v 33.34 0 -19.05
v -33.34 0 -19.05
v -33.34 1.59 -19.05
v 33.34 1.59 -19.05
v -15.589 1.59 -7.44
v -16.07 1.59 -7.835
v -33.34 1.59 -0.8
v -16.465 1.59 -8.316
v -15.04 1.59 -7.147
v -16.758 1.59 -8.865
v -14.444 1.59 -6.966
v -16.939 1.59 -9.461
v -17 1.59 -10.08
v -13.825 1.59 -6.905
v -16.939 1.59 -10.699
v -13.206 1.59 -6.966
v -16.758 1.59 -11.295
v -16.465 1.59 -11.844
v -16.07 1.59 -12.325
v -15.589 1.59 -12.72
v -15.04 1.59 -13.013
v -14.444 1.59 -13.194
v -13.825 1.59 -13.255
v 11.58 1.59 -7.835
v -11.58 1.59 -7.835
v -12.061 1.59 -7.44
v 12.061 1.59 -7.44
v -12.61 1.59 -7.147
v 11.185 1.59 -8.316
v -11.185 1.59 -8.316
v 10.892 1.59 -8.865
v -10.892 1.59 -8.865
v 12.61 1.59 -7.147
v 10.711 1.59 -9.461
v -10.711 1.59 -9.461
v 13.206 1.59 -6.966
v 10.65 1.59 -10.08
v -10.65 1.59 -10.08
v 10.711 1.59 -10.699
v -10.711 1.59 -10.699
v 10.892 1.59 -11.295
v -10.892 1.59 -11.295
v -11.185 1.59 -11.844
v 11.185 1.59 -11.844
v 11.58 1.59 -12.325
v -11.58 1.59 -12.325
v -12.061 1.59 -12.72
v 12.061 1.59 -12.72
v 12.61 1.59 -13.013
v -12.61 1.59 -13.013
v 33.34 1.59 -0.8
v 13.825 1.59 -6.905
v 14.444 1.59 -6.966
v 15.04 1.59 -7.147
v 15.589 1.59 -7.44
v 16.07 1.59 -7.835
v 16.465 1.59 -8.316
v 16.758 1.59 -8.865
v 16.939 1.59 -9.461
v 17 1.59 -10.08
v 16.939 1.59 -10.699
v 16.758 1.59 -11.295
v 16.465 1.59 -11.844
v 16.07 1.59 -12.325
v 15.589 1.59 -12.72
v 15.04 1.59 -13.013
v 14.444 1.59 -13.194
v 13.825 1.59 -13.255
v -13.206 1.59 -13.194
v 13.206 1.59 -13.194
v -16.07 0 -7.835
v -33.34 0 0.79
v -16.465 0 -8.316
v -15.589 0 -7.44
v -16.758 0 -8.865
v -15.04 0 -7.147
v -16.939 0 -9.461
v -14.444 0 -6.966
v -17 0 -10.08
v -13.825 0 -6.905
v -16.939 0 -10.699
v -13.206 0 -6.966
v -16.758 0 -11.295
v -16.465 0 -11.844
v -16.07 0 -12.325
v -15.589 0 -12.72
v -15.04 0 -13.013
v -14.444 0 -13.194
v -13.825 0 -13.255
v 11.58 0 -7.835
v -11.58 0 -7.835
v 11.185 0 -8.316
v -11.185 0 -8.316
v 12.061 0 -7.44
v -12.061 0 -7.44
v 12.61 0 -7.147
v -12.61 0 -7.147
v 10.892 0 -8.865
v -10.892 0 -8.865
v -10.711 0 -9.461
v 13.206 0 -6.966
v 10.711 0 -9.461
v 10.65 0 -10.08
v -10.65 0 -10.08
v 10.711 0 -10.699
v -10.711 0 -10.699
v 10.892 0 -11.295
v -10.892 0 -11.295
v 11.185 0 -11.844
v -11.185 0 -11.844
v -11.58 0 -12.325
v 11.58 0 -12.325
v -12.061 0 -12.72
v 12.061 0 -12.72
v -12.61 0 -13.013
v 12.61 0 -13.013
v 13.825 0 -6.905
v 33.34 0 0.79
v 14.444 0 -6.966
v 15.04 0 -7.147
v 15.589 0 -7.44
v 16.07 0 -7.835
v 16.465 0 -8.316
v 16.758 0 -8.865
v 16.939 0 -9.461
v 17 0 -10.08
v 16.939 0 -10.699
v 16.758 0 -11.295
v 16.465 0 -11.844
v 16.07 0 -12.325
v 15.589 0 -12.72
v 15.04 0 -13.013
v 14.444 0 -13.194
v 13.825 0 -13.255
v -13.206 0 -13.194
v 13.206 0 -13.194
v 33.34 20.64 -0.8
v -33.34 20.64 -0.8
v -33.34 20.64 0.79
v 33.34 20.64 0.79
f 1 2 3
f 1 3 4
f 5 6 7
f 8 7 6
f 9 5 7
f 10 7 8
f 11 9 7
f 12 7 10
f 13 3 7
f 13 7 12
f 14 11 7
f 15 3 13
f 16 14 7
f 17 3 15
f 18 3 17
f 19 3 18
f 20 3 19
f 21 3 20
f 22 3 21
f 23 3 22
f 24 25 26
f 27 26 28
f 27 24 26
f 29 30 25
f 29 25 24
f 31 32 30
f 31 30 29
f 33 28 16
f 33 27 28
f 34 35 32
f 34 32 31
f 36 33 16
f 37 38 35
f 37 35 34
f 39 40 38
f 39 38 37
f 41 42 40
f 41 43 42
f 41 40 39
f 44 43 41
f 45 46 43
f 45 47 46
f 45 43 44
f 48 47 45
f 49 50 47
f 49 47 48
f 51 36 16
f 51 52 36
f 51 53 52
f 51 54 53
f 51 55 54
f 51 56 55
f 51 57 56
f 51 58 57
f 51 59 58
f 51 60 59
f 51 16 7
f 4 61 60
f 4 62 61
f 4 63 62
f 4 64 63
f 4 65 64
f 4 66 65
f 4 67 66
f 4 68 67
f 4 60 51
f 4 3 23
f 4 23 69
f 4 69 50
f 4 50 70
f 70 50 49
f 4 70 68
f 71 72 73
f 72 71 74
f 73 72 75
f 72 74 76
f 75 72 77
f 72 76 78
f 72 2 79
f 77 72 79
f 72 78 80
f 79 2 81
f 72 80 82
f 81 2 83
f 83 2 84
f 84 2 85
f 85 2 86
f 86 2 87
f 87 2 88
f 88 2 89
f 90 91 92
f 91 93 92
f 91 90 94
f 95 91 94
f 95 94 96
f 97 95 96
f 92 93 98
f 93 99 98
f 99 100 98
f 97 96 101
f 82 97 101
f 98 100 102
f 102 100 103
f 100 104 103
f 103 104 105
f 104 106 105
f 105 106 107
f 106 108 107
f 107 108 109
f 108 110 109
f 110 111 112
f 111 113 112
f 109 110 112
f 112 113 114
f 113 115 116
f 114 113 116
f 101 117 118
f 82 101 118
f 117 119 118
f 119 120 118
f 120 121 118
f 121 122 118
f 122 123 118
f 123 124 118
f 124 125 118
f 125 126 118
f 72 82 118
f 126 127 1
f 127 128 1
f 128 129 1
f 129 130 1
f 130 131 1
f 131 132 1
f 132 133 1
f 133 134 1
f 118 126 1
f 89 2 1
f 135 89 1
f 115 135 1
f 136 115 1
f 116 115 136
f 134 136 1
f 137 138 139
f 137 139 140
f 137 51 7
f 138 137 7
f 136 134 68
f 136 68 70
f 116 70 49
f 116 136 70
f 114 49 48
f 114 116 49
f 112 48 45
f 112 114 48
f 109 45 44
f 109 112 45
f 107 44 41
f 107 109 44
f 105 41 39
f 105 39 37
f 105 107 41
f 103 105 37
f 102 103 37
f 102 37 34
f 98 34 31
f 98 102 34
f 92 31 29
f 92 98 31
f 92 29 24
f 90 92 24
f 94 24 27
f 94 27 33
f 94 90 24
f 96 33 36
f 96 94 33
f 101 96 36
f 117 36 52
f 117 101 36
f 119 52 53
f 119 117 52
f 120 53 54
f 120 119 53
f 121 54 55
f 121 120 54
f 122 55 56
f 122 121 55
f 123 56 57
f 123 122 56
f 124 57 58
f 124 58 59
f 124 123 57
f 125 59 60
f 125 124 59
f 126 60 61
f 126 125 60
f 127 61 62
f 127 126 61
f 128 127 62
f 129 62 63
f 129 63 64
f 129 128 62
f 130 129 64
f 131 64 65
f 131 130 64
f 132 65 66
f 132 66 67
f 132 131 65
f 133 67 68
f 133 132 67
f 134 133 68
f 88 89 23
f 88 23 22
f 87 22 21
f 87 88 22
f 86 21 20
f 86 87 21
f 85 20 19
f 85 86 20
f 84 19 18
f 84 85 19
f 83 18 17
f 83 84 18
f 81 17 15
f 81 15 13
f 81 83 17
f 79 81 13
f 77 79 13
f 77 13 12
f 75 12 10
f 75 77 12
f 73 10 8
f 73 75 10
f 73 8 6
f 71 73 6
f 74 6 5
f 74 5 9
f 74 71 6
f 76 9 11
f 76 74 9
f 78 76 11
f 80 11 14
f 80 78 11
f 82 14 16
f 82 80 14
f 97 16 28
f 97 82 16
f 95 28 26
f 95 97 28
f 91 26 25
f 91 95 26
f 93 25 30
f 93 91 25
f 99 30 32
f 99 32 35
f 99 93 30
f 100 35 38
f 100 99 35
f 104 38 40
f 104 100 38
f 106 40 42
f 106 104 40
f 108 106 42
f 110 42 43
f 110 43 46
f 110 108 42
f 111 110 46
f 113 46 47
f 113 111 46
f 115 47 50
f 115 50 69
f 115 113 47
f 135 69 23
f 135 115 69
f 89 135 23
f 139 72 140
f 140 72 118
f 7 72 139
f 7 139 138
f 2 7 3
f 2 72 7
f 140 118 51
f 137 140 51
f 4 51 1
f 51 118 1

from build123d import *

# Parameters (mm, degrees)
SKETCH1_W           = 66.68
SKETCH1_H           = 1.59
BOSS_EXTRUDE1_DEPTH = 20.64
SKETCH1_3_W         = 66.68
SKETCH1_3_H         = 19.84
SKETCH1_3_R         = 3.175
BOSS_EXTRUDE2_DEPTH = 1.59


with BuildPart() as part:
    # Sketch1 → Boss-Extrude1 (new body)
    with BuildSketch(Plane(origin=(0, 0, 0), x_dir=(1, 0, 0), z_dir=(0, 1, 0))):
        with Locations((0, 0.005)):
            Rectangle(SKETCH1_W, SKETCH1_H)
    extrude(amount=BOSS_EXTRUDE1_DEPTH)

    # Sketch1<3> → Boss-Extrude2 (add)
    with BuildSketch(Plane(origin=(0, 0, 0), x_dir=(1, 0, 0), z_dir=(0, 1, 0))):
        with Locations((0, 9.13)):
            Rectangle(SKETCH1_3_W, SKETCH1_3_H)
        with Locations((13.825, 10.08)):
            Circle(SKETCH1_3_R, mode=Mode.SUBTRACT)
        with Locations((-13.825, 10.08)):
            Circle(SKETCH1_3_R, mode=Mode.SUBTRACT)
    extrude(amount=BOSS_EXTRUDE2_DEPTH)


solid = part.part
